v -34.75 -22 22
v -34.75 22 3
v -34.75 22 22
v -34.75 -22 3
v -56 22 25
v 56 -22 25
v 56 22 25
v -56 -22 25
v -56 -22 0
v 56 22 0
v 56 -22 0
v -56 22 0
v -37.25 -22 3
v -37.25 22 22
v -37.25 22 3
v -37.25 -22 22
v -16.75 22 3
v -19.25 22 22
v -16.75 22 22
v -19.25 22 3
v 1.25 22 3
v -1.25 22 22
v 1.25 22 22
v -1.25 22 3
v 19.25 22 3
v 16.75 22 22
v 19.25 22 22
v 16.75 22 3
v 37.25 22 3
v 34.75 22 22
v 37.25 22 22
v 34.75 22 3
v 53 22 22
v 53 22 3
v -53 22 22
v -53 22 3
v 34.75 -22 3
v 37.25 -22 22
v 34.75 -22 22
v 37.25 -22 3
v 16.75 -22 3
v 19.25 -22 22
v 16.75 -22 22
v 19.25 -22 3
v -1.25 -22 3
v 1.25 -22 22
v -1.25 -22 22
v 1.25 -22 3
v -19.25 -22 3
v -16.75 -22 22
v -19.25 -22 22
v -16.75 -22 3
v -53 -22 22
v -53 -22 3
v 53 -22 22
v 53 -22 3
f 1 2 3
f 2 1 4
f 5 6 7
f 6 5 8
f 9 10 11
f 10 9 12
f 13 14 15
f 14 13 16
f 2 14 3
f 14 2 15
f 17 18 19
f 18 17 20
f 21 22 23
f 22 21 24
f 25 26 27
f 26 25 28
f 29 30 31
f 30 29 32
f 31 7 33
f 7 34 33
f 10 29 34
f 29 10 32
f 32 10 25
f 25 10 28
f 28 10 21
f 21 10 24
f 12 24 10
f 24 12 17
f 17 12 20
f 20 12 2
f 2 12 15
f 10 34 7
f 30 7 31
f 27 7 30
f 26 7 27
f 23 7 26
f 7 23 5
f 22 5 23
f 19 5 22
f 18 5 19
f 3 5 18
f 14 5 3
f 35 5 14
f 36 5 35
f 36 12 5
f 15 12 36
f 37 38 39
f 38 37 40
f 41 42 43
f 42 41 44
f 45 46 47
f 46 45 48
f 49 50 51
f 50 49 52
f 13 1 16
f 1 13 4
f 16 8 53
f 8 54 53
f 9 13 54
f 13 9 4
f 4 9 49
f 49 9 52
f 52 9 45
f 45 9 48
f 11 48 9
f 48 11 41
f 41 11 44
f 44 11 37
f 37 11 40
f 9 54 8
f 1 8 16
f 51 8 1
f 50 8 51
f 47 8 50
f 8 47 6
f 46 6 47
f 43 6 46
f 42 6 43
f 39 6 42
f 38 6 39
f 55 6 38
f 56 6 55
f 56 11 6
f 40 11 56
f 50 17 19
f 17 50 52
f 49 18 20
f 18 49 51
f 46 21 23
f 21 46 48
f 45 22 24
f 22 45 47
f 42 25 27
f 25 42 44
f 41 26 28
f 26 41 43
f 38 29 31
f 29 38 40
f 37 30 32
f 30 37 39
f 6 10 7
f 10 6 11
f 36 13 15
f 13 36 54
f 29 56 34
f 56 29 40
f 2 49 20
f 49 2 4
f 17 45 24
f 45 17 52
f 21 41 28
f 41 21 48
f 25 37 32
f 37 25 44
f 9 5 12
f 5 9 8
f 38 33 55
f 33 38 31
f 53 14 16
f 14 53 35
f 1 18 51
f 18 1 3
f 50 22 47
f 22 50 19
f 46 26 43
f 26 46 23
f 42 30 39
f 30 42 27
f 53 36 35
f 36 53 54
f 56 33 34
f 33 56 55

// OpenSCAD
// Open-sided cuvette rack for twelve 12.5mm square cuvettes.
// Designed for FDM printing, standing on the base.

// --- Dimensions ---
base_x      = 112.0;    // Length of base plate (X)
base_y      = 44.0;     // Width of base plate (Y)
base_z      = 3.0;      // Thickness of base plate (Z)

deck_x      = 112.0;    // Length of deck plate (X)
deck_y      = 44.0;     // Width of deck plate (Y)
deck_z_min  = 22.0;     // Bottom of deck plate (Z)
deck_z_max  = 25.0;     // Top of deck plate (Z)

wall_end_t  = 3.0;      // Thickness of end walls (X-direction)
wall_rib_t  = 2.5;      // Thickness of internal ribs (X-direction)
wall_depth  = 44.0;     // Depth of walls (Y-direction)
wall_height = 25.0;     // Total height of walls (Z)

hole_size   = 13.0;     // Size of cuvette holes (X and Y)
hole_pitch  = 18.0;     // Center-to-center spacing of holes (X and Y)
rows        = 2;        // Number of rows (Y)
cols        = 6;        // Number of columns (X)

$fn = 64;

// --- Calculations ---
// Centering the holes on the deck
// For 6 holes with 18mm pitch, the span is (6-1)*18 = 90mm.
// To center 90mm on 112mm: (112 - 90)/2 = 11mm offset from edge.
// However, the prompt specifies "18 mm centre-to-centre... and centred on the deck".
// We calculate the start position based on the pitch and number of items.

hole_offset_x = (cols - 1) * hole_pitch / 2;
hole_offset_y = (rows - 1) * hole_pitch / 2;

// --- Geometry ---

module wall_rib(x_pos, thickness) {
    translate([x_pos, -wall_depth/2, 0])
        cube([thickness, wall_depth, wall_height]);
}

// Main Body Construction
union() {
    // Base Plate
    translate([-base_x/2, -base_y/2, 0])
        cube([base_x, base_y, base_z]);

    // Deck Plate
    translate([-deck_x/2, -deck_y/2, deck_z_min])
        cube([deck_x, deck_y, deck_z_max - deck_z_min]);

    // End Walls (Flush with short ends)
    // Left end wall
    translate([-base_x/2, -base_y/2, 0])
        cube([wall_end_t, base_y, wall_height]);
    // Right end wall
    translate([base_x/2 - wall_end_t, -base_y/2, 0])
        cube([wall_end_t, base_y, wall_height]);

    // Internal Ribs
    // Ribs at x = -36, -18, 0, 18, 36
    for (rx = [-36, -18, 0, 18, 36]) {
        // We use a small offset to ensure the rib is centered on the coordinate
        // Since the cube is drawn from [0,0,0], we translate to [pos - t/2]
        translate([rx - wall_rib_t/2, -wall_depth/2, 0])
            cube([wall_rib_t, wall_depth, wall_height]);
    }
}

// Subtract Holes from the Deck
difference() {
    // We wrap the whole thing in a difference to cut holes through the deck
    // But to keep the code clean, we only apply the difference to the deck part.
    // Since OpenSCAD is declarative, we'll structure the final assembly below.
}

// Final Assembly with Holes
difference() {
    // The entire solid object
    union() {
        // Base
        translate([-base_x/2, -base_y/2, 0])
            cube([base_x, base_y, base_z]);
        // Deck
        translate([-deck_x/2, -deck_y/2, deck_z_min])
            cube([deck_x, deck_y, deck_z_max - deck_z_min]);
        // End Walls
        translate([-base_x/2, -base_y/2, 0])
            cube([wall_end_t, base_y, wall_height]);
        translate([base_x/2 - wall_end_t, -base_y/2, 0])
            cube([wall_end_t, base_y, wall_height]);
        // Ribs
        for (rx = [-36, -18, 0, 18, 36]) {
            translate([rx - wall_rib_t/2, -wall_depth/2, 0])
                cube([wall_rib_t, wall_depth, wall_height]);
        }
    }

    // Holes (Cutting through the deck)
    // We extend the hole height to ensure it cuts through the deck completely
    for (i = [0 : cols - 1]) {
        for (j = [0 : rows - 1]) {
            translate([
                (i * hole_pitch) - hole_offset_x, 
                (j * hole_pitch) - hole_offset_y, 
                deck_z_min - 1
            ])
                cube([hole_size, hole_size, (deck_z_max - deck_z_min) + 2]);
        }
    }
}
